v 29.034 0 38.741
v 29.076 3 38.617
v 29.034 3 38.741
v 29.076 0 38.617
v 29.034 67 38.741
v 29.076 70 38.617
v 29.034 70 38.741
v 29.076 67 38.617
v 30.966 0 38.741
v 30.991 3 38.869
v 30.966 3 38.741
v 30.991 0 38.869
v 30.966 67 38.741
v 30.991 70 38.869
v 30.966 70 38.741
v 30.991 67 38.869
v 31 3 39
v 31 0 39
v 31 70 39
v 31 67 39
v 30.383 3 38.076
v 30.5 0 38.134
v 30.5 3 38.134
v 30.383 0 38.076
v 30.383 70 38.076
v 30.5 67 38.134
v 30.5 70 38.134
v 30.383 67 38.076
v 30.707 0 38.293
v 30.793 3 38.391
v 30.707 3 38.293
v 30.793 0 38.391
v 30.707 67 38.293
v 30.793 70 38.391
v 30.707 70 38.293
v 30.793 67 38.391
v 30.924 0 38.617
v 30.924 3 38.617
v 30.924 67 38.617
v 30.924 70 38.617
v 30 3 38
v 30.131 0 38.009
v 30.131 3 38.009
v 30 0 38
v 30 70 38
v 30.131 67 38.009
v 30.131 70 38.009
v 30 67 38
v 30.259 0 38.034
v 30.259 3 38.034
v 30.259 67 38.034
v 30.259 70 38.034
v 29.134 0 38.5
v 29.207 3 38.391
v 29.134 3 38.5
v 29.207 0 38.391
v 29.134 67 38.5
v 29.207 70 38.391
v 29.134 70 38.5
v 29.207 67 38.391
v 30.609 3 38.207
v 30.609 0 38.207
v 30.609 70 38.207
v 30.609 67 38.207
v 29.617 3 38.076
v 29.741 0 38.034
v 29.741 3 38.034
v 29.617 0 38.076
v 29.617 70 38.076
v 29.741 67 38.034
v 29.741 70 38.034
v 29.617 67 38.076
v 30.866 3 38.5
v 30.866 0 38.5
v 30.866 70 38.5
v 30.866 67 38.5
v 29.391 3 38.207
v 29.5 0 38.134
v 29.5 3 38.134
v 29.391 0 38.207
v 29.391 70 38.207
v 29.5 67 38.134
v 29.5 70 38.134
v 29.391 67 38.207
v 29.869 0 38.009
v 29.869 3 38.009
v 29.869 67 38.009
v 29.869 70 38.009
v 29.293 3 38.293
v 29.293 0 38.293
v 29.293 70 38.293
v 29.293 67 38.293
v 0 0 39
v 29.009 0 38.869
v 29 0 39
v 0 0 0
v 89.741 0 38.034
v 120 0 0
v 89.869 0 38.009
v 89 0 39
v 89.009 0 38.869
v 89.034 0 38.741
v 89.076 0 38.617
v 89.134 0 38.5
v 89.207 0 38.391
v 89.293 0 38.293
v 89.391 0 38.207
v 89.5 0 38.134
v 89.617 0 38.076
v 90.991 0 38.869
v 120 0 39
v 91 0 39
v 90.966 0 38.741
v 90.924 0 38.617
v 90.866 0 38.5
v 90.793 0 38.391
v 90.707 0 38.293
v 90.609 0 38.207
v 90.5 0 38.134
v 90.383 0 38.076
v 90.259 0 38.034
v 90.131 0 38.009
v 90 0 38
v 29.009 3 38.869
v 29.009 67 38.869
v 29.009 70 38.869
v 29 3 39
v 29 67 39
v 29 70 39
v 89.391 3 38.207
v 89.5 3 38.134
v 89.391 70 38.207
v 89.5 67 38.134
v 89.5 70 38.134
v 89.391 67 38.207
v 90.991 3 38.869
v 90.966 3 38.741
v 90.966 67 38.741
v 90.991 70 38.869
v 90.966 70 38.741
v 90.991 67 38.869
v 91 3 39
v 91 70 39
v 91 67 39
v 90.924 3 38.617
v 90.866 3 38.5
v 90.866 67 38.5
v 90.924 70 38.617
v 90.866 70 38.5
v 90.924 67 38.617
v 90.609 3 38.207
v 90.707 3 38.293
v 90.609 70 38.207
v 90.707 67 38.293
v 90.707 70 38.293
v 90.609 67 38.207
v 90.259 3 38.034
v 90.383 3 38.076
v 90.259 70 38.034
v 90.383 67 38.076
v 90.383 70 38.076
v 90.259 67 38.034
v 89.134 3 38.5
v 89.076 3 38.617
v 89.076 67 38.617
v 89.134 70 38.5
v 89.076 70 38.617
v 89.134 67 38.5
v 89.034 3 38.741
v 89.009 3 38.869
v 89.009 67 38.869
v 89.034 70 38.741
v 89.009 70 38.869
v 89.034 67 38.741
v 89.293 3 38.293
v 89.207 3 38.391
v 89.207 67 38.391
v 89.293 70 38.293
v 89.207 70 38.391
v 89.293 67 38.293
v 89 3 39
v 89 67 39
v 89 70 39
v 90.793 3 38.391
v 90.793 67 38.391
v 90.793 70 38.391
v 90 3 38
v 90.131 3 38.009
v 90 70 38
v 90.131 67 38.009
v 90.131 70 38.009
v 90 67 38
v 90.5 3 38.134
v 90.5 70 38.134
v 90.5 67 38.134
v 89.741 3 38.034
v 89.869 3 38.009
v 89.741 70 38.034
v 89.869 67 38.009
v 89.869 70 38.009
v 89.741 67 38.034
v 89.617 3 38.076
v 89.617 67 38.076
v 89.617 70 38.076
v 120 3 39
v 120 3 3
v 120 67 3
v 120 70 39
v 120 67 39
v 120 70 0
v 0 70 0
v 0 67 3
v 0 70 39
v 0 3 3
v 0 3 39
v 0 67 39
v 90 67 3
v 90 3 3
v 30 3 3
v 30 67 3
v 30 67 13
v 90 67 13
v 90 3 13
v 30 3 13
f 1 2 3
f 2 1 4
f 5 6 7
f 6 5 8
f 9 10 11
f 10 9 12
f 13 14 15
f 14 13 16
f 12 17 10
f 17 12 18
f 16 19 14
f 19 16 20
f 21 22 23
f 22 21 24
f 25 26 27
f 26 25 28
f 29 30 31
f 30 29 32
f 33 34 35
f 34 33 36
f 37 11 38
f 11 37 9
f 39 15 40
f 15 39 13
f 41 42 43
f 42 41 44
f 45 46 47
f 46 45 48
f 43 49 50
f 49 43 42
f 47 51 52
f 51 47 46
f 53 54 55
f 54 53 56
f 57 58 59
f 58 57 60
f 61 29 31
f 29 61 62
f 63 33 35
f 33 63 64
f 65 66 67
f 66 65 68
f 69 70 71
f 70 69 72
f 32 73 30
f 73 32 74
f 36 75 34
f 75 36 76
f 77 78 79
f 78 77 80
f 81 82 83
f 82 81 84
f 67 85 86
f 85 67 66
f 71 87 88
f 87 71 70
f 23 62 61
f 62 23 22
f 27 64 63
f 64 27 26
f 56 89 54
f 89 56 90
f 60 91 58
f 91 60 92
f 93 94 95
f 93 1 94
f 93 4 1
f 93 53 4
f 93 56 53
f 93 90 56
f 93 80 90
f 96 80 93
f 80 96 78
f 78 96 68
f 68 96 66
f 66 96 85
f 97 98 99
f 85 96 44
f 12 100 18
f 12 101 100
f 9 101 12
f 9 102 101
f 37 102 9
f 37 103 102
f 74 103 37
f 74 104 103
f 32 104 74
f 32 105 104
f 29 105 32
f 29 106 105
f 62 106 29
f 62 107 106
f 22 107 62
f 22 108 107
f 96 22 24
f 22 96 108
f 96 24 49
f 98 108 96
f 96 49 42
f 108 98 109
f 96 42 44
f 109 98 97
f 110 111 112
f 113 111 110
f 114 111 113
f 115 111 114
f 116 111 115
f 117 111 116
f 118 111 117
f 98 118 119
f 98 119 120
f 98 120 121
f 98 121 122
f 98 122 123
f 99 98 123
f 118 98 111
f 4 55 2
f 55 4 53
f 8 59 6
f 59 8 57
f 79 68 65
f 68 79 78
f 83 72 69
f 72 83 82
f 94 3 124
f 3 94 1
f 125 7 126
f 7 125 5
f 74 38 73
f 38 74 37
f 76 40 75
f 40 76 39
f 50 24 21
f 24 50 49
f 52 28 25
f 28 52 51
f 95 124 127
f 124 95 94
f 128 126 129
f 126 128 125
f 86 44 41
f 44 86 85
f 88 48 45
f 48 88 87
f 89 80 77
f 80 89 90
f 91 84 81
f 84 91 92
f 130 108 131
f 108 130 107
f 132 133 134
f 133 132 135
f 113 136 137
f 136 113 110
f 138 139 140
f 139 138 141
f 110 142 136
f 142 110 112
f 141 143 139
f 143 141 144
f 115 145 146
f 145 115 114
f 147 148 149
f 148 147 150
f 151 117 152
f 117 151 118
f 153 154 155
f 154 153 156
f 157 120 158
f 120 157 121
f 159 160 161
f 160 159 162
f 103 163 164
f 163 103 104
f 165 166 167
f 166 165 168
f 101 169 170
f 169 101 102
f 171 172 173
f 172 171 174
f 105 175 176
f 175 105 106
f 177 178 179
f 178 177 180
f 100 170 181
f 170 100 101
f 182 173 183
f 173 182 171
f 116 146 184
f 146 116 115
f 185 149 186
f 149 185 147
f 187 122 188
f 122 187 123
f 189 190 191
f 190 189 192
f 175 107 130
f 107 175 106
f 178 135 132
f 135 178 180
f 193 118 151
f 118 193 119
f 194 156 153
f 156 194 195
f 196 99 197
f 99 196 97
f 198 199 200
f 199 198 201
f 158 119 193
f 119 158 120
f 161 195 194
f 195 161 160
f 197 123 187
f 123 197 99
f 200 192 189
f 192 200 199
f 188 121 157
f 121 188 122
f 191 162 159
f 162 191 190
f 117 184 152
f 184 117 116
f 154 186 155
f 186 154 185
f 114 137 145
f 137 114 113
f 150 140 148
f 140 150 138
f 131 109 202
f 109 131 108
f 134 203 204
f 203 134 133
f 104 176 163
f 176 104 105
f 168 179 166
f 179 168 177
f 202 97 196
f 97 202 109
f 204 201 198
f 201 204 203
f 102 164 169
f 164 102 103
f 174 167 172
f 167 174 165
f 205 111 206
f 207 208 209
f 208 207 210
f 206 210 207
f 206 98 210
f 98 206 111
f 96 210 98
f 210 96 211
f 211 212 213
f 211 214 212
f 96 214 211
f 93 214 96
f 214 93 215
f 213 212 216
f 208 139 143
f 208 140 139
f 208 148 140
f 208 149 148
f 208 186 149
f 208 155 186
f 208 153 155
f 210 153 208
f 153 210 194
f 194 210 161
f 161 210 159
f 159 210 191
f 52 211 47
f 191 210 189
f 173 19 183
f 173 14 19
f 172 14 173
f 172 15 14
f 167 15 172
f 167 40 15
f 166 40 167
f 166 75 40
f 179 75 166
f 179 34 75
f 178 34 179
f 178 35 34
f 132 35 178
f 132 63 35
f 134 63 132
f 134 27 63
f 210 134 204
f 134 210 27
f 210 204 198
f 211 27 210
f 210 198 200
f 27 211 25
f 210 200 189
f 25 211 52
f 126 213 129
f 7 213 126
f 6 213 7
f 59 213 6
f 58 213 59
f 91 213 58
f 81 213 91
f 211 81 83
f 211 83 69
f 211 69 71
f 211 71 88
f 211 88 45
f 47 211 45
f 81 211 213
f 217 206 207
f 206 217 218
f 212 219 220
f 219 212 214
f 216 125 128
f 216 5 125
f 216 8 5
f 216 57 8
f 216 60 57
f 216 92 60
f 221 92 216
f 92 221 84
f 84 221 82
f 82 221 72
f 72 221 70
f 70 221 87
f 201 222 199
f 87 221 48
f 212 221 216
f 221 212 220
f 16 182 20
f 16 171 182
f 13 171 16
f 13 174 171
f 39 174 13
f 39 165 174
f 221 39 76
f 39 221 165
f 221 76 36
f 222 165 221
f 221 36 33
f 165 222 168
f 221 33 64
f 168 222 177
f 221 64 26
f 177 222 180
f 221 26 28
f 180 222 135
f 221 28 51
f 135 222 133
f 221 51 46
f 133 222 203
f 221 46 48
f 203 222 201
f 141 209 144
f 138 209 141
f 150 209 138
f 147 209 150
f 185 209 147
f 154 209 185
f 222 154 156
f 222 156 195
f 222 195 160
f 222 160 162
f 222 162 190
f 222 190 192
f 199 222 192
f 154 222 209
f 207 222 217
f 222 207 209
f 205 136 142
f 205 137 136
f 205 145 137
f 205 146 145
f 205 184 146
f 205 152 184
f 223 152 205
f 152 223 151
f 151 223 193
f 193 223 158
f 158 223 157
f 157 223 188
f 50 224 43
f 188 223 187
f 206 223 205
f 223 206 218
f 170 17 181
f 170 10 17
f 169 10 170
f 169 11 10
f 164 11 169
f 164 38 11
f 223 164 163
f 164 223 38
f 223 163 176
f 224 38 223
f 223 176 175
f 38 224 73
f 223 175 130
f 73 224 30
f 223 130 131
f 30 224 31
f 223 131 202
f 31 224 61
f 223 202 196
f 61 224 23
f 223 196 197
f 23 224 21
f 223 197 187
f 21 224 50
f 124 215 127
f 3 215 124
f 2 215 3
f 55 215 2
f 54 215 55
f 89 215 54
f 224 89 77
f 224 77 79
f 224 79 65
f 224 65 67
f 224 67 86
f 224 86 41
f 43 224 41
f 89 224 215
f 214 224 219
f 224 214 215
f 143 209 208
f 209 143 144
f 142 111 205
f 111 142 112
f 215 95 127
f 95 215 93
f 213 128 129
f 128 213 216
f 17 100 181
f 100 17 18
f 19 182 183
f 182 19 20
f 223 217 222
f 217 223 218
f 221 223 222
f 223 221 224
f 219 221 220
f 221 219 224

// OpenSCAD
// Open-top rectangular buffer tank for a mini horizontal gel-electrophoresis box. NOVEL general part.
//

tank_l = 120;
tank_w = 70;
tank_h = 40;
wall   = 3;
floor  = 3;

$fn = 48;

inner_w = tank_w - 2 * wall;
chamber_h = tank_h - floor;

difference() {
    cube([tank_l, tank_w, tank_h]);
    translate([0, wall, floor]) cube([tank_l, inner_w, tank_h - floor]);     // hollow: walls + floor
    translate([0, 0, tank_h - 1]) cube([tank_l, tank_w, 1]);                // open top
    for (x = [tank_l / 2 - 30, tank_l / 2 + 30])
        translate([x, 0, tank_h - 1]) rotate([-90, 0, 0]) cylinder(h = tank_w + 2, d = 2);   // electrode holes
}

module platform() {
    p_w = tank_w - 2 * wall;                 // spans the full inner width
    p_l = 60;
    p_t = 10;
    translate([tank_l / 2 - p_l / 2, wall, floor]) cube([p_l, p_w, p_t]);
}

platform();
